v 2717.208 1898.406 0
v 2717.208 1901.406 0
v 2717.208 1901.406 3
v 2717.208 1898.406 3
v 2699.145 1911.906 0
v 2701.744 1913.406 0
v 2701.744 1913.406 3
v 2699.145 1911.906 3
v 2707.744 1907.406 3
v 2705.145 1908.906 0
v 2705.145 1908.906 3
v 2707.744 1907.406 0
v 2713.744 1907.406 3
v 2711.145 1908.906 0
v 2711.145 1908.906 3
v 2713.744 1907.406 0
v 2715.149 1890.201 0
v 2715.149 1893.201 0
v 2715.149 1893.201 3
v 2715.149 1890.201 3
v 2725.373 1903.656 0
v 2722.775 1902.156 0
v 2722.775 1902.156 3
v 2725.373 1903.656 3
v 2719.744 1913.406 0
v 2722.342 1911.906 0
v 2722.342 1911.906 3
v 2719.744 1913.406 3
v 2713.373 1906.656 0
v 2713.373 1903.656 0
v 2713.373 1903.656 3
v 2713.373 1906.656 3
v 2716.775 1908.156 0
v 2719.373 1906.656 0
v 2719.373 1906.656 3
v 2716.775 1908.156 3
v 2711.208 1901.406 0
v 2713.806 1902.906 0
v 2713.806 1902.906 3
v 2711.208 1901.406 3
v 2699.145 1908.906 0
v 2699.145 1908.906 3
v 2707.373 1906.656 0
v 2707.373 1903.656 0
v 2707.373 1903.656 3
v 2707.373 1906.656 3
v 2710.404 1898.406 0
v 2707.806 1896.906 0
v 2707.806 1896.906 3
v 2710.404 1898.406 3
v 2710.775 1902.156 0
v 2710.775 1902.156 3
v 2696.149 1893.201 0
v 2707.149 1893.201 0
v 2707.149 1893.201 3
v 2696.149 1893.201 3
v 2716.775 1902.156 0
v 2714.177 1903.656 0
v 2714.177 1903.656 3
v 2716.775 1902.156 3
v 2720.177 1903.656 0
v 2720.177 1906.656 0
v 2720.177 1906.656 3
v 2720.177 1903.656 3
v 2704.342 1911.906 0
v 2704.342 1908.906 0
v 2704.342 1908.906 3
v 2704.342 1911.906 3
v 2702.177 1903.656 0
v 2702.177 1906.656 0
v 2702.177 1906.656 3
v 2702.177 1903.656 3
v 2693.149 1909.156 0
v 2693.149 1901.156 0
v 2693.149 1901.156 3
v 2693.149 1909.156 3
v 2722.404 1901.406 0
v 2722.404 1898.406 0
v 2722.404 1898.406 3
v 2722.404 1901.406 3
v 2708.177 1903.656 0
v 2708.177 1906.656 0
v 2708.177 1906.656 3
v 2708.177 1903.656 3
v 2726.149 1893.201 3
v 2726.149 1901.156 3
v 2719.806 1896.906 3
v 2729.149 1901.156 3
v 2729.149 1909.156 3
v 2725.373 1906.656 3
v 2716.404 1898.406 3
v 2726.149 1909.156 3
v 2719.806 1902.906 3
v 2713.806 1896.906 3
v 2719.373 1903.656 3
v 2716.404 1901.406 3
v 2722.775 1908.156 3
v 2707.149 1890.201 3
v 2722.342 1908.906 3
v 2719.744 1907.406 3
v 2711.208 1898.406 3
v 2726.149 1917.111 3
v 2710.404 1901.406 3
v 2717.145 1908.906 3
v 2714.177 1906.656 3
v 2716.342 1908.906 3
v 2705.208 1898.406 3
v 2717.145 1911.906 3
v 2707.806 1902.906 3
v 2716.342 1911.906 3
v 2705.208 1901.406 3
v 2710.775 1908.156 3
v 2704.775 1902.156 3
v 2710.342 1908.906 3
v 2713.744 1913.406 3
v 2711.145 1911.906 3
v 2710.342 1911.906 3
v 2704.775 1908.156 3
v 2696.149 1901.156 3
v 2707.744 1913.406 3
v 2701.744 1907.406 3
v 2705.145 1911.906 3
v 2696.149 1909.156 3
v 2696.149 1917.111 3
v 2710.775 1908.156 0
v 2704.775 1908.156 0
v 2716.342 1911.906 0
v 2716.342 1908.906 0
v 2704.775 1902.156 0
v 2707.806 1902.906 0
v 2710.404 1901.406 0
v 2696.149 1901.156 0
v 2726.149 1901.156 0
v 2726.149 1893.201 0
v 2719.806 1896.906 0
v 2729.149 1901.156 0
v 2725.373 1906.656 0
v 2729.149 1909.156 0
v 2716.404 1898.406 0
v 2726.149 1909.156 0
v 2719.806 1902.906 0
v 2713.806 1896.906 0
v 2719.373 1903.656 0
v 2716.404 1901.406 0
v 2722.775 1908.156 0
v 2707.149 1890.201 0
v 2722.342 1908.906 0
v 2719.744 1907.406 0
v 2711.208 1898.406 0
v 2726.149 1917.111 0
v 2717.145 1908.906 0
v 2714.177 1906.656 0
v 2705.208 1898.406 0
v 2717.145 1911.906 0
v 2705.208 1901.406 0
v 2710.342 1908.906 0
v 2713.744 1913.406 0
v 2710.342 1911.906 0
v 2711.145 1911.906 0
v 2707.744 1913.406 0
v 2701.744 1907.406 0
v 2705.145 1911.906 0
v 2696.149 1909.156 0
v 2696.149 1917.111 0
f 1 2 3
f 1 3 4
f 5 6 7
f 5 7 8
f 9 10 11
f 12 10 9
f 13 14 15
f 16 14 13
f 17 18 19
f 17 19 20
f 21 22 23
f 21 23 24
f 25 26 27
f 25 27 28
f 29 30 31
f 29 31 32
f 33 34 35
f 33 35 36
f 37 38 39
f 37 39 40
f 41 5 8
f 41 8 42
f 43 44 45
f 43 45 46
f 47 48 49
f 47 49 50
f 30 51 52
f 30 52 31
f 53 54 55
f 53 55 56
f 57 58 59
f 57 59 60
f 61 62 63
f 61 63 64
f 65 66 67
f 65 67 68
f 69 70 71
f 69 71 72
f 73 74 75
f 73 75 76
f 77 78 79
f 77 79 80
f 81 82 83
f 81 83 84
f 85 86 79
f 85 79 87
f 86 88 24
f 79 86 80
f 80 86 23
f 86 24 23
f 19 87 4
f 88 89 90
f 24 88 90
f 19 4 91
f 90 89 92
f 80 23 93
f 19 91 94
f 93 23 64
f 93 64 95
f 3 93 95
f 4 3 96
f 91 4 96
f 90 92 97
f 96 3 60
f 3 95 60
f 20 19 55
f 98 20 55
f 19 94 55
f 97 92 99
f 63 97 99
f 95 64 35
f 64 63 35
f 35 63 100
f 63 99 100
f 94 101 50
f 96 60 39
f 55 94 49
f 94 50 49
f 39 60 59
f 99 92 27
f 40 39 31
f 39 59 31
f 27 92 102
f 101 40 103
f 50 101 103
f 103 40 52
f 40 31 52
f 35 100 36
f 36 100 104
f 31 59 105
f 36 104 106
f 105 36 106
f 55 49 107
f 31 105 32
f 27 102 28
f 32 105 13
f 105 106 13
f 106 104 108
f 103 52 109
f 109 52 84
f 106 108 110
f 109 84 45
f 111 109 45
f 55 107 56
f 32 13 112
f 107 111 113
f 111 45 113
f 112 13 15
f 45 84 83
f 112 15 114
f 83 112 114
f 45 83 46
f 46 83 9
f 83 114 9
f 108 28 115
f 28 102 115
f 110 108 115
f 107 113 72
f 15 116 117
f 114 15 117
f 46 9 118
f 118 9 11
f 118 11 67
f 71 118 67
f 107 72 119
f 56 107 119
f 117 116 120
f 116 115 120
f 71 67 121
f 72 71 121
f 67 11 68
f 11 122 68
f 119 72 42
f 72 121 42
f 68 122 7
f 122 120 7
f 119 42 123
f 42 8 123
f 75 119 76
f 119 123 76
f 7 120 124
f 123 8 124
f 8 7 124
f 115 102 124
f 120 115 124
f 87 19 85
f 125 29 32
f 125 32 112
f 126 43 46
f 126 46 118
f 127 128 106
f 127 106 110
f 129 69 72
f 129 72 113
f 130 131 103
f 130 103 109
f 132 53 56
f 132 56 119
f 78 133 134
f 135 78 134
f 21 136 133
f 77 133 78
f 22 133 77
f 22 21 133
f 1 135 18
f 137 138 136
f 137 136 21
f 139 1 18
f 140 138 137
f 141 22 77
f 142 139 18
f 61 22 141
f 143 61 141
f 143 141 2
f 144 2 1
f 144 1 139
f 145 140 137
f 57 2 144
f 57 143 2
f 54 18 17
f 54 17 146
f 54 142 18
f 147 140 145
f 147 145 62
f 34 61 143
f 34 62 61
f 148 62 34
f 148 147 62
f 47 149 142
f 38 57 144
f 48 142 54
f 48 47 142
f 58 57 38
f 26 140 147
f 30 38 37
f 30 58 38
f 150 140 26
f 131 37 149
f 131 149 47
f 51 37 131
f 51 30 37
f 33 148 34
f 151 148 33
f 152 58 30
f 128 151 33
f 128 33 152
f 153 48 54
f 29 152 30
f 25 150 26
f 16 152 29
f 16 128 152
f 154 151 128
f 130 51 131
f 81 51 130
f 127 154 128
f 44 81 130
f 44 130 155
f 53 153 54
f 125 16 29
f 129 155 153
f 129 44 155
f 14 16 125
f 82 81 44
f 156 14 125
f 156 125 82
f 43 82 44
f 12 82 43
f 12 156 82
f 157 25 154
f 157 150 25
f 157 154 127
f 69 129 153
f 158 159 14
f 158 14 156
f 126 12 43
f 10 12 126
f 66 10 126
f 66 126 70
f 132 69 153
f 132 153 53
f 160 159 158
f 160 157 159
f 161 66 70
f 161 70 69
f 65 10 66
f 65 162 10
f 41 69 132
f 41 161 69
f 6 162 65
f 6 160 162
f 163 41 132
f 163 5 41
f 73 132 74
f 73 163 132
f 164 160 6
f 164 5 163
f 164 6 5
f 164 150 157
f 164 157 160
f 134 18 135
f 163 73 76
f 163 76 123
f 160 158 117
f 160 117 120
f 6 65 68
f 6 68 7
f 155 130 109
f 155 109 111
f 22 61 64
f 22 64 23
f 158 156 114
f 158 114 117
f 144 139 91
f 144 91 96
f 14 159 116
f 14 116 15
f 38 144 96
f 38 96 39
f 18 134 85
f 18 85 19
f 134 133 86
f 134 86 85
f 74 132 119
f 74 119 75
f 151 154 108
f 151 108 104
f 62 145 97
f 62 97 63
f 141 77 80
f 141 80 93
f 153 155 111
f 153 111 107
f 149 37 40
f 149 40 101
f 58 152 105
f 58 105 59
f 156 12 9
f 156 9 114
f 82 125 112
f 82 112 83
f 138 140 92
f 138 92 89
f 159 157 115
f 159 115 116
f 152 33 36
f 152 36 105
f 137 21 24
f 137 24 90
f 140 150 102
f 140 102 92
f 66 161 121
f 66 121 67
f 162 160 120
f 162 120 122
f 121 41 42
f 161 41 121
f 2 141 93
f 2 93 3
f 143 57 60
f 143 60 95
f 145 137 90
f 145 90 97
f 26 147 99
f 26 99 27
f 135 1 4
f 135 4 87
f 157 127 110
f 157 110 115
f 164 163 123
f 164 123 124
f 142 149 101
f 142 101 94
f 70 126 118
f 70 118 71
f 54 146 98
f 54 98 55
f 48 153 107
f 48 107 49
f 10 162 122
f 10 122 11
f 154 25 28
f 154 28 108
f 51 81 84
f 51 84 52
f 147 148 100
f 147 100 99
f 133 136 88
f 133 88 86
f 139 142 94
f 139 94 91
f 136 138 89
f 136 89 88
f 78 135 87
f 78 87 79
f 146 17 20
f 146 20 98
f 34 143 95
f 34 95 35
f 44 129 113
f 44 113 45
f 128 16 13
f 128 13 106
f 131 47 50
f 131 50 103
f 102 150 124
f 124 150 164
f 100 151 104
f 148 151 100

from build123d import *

# Parameters (mm, degrees)
EXTRUDE_1_DEPTH = 3


with BuildPart() as part:
    # 草图1 → 凸台-拉伸1 (new body)
    with BuildSketch(Plane.XY):
        Polygon((2696.149099258, 1909.156494091), (2696.149099258, 1917.111494091), (2707.149099258, 1917.111494091), (2715.149099258, 1917.111494091), (2726.149099258, 1917.111494091), (2726.149099258, 1909.156494091), (2729.149099258, 1909.156494091), (2729.149099258, 1901.156494091), (2726.149099258, 1901.156494091), (2726.149099258, 1893.201494091), (2715.149099258, 1893.201494091), (2715.149099258, 1890.201494091), (2707.149099258, 1890.201494091), (2707.149099258, 1893.201494091), (2696.149099258, 1893.201494091), (2696.149099258, 1901.156494091), (2693.149099258, 1901.156494091), (2693.149099258, 1909.156494091), align=None)
        Polygon((2699.145425292, 1908.906494091), (2701.743501504, 1907.406494091), (2704.341577715, 1908.906494091), (2704.341577715, 1911.906494091), (2701.743501504, 1913.406494091), (2699.145425292, 1911.906494091), align=None, mode=Mode.SUBTRACT)
        Polygon((2705.145425292, 1908.906494091), (2707.743501504, 1907.406494091), (2710.341577715, 1908.906494091), (2710.341577715, 1911.906494091), (2707.743501504, 1913.406494091), (2705.145425292, 1911.906494091), align=None, mode=Mode.SUBTRACT)
        Polygon((2711.145425292, 1908.906494091), (2713.743501504, 1907.406494091), (2716.341577715, 1908.906494091), (2716.341577715, 1911.906494091), (2713.743501504, 1913.406494091), (2711.145425292, 1911.906494091), align=None, mode=Mode.SUBTRACT)
        Polygon((2717.145425292, 1908.906494091), (2719.743501504, 1907.406494091), (2722.341577715, 1908.906494091), (2722.341577715, 1911.906494091), (2719.743501504, 1913.406494091), (2717.145425292, 1911.906494091), align=None, mode=Mode.SUBTRACT)
        Polygon((2702.176514206, 1903.656494091), (2704.774590417, 1902.156494091), (2707.372666628, 1903.656494091), (2707.372666628, 1906.656494091), (2704.774590417, 1908.156494091), (2702.176514206, 1906.656494091), align=None, mode=Mode.SUBTRACT)
        Polygon((2708.176514206, 1903.656494091), (2710.774590417, 1902.156494091), (2713.372666628, 1903.656494091), (2713.372666628, 1906.656494091), (2710.774590417, 1908.156494091), (2708.176514206, 1906.656494091), align=None, mode=Mode.SUBTRACT)
        Polygon((2714.176514206, 1903.656494091), (2716.774590417, 1902.156494091), (2719.372666628, 1903.656494091), (2719.372666628, 1906.656494091), (2716.774590417, 1908.156494091), (2714.176514206, 1906.656494091), align=None, mode=Mode.SUBTRACT)
        Polygon((2720.176514206, 1903.656494091), (2722.774590417, 1902.156494091), (2725.372666628, 1903.656494091), (2725.372666628, 1906.656494091), (2722.774590417, 1908.156494091), (2720.176514206, 1906.656494091), align=None, mode=Mode.SUBTRACT)
        Polygon((2705.207603119, 1898.406494091), (2707.80567933, 1896.906494091), (2710.403755542, 1898.406494091), (2710.403755542, 1901.406494091), (2707.80567933, 1902.906494091), (2705.207603119, 1901.406494091), align=None, mode=Mode.SUBTRACT)
        Polygon((2711.207603119, 1898.406494091), (2713.80567933, 1896.906494091), (2716.403755542, 1898.406494091), (2716.403755542, 1901.406494091), (2713.80567933, 1902.906494091), (2711.207603119, 1901.406494091), align=None, mode=Mode.SUBTRACT)
        Polygon((2717.207603119, 1898.406494091), (2719.80567933, 1896.906494091), (2722.403755542, 1898.406494091), (2722.403755542, 1901.406494091), (2719.80567933, 1902.906494091), (2717.207603119, 1901.406494091), align=None, mode=Mode.SUBTRACT)
    extrude(amount=EXTRUDE_1_DEPTH)


solid = part.part
